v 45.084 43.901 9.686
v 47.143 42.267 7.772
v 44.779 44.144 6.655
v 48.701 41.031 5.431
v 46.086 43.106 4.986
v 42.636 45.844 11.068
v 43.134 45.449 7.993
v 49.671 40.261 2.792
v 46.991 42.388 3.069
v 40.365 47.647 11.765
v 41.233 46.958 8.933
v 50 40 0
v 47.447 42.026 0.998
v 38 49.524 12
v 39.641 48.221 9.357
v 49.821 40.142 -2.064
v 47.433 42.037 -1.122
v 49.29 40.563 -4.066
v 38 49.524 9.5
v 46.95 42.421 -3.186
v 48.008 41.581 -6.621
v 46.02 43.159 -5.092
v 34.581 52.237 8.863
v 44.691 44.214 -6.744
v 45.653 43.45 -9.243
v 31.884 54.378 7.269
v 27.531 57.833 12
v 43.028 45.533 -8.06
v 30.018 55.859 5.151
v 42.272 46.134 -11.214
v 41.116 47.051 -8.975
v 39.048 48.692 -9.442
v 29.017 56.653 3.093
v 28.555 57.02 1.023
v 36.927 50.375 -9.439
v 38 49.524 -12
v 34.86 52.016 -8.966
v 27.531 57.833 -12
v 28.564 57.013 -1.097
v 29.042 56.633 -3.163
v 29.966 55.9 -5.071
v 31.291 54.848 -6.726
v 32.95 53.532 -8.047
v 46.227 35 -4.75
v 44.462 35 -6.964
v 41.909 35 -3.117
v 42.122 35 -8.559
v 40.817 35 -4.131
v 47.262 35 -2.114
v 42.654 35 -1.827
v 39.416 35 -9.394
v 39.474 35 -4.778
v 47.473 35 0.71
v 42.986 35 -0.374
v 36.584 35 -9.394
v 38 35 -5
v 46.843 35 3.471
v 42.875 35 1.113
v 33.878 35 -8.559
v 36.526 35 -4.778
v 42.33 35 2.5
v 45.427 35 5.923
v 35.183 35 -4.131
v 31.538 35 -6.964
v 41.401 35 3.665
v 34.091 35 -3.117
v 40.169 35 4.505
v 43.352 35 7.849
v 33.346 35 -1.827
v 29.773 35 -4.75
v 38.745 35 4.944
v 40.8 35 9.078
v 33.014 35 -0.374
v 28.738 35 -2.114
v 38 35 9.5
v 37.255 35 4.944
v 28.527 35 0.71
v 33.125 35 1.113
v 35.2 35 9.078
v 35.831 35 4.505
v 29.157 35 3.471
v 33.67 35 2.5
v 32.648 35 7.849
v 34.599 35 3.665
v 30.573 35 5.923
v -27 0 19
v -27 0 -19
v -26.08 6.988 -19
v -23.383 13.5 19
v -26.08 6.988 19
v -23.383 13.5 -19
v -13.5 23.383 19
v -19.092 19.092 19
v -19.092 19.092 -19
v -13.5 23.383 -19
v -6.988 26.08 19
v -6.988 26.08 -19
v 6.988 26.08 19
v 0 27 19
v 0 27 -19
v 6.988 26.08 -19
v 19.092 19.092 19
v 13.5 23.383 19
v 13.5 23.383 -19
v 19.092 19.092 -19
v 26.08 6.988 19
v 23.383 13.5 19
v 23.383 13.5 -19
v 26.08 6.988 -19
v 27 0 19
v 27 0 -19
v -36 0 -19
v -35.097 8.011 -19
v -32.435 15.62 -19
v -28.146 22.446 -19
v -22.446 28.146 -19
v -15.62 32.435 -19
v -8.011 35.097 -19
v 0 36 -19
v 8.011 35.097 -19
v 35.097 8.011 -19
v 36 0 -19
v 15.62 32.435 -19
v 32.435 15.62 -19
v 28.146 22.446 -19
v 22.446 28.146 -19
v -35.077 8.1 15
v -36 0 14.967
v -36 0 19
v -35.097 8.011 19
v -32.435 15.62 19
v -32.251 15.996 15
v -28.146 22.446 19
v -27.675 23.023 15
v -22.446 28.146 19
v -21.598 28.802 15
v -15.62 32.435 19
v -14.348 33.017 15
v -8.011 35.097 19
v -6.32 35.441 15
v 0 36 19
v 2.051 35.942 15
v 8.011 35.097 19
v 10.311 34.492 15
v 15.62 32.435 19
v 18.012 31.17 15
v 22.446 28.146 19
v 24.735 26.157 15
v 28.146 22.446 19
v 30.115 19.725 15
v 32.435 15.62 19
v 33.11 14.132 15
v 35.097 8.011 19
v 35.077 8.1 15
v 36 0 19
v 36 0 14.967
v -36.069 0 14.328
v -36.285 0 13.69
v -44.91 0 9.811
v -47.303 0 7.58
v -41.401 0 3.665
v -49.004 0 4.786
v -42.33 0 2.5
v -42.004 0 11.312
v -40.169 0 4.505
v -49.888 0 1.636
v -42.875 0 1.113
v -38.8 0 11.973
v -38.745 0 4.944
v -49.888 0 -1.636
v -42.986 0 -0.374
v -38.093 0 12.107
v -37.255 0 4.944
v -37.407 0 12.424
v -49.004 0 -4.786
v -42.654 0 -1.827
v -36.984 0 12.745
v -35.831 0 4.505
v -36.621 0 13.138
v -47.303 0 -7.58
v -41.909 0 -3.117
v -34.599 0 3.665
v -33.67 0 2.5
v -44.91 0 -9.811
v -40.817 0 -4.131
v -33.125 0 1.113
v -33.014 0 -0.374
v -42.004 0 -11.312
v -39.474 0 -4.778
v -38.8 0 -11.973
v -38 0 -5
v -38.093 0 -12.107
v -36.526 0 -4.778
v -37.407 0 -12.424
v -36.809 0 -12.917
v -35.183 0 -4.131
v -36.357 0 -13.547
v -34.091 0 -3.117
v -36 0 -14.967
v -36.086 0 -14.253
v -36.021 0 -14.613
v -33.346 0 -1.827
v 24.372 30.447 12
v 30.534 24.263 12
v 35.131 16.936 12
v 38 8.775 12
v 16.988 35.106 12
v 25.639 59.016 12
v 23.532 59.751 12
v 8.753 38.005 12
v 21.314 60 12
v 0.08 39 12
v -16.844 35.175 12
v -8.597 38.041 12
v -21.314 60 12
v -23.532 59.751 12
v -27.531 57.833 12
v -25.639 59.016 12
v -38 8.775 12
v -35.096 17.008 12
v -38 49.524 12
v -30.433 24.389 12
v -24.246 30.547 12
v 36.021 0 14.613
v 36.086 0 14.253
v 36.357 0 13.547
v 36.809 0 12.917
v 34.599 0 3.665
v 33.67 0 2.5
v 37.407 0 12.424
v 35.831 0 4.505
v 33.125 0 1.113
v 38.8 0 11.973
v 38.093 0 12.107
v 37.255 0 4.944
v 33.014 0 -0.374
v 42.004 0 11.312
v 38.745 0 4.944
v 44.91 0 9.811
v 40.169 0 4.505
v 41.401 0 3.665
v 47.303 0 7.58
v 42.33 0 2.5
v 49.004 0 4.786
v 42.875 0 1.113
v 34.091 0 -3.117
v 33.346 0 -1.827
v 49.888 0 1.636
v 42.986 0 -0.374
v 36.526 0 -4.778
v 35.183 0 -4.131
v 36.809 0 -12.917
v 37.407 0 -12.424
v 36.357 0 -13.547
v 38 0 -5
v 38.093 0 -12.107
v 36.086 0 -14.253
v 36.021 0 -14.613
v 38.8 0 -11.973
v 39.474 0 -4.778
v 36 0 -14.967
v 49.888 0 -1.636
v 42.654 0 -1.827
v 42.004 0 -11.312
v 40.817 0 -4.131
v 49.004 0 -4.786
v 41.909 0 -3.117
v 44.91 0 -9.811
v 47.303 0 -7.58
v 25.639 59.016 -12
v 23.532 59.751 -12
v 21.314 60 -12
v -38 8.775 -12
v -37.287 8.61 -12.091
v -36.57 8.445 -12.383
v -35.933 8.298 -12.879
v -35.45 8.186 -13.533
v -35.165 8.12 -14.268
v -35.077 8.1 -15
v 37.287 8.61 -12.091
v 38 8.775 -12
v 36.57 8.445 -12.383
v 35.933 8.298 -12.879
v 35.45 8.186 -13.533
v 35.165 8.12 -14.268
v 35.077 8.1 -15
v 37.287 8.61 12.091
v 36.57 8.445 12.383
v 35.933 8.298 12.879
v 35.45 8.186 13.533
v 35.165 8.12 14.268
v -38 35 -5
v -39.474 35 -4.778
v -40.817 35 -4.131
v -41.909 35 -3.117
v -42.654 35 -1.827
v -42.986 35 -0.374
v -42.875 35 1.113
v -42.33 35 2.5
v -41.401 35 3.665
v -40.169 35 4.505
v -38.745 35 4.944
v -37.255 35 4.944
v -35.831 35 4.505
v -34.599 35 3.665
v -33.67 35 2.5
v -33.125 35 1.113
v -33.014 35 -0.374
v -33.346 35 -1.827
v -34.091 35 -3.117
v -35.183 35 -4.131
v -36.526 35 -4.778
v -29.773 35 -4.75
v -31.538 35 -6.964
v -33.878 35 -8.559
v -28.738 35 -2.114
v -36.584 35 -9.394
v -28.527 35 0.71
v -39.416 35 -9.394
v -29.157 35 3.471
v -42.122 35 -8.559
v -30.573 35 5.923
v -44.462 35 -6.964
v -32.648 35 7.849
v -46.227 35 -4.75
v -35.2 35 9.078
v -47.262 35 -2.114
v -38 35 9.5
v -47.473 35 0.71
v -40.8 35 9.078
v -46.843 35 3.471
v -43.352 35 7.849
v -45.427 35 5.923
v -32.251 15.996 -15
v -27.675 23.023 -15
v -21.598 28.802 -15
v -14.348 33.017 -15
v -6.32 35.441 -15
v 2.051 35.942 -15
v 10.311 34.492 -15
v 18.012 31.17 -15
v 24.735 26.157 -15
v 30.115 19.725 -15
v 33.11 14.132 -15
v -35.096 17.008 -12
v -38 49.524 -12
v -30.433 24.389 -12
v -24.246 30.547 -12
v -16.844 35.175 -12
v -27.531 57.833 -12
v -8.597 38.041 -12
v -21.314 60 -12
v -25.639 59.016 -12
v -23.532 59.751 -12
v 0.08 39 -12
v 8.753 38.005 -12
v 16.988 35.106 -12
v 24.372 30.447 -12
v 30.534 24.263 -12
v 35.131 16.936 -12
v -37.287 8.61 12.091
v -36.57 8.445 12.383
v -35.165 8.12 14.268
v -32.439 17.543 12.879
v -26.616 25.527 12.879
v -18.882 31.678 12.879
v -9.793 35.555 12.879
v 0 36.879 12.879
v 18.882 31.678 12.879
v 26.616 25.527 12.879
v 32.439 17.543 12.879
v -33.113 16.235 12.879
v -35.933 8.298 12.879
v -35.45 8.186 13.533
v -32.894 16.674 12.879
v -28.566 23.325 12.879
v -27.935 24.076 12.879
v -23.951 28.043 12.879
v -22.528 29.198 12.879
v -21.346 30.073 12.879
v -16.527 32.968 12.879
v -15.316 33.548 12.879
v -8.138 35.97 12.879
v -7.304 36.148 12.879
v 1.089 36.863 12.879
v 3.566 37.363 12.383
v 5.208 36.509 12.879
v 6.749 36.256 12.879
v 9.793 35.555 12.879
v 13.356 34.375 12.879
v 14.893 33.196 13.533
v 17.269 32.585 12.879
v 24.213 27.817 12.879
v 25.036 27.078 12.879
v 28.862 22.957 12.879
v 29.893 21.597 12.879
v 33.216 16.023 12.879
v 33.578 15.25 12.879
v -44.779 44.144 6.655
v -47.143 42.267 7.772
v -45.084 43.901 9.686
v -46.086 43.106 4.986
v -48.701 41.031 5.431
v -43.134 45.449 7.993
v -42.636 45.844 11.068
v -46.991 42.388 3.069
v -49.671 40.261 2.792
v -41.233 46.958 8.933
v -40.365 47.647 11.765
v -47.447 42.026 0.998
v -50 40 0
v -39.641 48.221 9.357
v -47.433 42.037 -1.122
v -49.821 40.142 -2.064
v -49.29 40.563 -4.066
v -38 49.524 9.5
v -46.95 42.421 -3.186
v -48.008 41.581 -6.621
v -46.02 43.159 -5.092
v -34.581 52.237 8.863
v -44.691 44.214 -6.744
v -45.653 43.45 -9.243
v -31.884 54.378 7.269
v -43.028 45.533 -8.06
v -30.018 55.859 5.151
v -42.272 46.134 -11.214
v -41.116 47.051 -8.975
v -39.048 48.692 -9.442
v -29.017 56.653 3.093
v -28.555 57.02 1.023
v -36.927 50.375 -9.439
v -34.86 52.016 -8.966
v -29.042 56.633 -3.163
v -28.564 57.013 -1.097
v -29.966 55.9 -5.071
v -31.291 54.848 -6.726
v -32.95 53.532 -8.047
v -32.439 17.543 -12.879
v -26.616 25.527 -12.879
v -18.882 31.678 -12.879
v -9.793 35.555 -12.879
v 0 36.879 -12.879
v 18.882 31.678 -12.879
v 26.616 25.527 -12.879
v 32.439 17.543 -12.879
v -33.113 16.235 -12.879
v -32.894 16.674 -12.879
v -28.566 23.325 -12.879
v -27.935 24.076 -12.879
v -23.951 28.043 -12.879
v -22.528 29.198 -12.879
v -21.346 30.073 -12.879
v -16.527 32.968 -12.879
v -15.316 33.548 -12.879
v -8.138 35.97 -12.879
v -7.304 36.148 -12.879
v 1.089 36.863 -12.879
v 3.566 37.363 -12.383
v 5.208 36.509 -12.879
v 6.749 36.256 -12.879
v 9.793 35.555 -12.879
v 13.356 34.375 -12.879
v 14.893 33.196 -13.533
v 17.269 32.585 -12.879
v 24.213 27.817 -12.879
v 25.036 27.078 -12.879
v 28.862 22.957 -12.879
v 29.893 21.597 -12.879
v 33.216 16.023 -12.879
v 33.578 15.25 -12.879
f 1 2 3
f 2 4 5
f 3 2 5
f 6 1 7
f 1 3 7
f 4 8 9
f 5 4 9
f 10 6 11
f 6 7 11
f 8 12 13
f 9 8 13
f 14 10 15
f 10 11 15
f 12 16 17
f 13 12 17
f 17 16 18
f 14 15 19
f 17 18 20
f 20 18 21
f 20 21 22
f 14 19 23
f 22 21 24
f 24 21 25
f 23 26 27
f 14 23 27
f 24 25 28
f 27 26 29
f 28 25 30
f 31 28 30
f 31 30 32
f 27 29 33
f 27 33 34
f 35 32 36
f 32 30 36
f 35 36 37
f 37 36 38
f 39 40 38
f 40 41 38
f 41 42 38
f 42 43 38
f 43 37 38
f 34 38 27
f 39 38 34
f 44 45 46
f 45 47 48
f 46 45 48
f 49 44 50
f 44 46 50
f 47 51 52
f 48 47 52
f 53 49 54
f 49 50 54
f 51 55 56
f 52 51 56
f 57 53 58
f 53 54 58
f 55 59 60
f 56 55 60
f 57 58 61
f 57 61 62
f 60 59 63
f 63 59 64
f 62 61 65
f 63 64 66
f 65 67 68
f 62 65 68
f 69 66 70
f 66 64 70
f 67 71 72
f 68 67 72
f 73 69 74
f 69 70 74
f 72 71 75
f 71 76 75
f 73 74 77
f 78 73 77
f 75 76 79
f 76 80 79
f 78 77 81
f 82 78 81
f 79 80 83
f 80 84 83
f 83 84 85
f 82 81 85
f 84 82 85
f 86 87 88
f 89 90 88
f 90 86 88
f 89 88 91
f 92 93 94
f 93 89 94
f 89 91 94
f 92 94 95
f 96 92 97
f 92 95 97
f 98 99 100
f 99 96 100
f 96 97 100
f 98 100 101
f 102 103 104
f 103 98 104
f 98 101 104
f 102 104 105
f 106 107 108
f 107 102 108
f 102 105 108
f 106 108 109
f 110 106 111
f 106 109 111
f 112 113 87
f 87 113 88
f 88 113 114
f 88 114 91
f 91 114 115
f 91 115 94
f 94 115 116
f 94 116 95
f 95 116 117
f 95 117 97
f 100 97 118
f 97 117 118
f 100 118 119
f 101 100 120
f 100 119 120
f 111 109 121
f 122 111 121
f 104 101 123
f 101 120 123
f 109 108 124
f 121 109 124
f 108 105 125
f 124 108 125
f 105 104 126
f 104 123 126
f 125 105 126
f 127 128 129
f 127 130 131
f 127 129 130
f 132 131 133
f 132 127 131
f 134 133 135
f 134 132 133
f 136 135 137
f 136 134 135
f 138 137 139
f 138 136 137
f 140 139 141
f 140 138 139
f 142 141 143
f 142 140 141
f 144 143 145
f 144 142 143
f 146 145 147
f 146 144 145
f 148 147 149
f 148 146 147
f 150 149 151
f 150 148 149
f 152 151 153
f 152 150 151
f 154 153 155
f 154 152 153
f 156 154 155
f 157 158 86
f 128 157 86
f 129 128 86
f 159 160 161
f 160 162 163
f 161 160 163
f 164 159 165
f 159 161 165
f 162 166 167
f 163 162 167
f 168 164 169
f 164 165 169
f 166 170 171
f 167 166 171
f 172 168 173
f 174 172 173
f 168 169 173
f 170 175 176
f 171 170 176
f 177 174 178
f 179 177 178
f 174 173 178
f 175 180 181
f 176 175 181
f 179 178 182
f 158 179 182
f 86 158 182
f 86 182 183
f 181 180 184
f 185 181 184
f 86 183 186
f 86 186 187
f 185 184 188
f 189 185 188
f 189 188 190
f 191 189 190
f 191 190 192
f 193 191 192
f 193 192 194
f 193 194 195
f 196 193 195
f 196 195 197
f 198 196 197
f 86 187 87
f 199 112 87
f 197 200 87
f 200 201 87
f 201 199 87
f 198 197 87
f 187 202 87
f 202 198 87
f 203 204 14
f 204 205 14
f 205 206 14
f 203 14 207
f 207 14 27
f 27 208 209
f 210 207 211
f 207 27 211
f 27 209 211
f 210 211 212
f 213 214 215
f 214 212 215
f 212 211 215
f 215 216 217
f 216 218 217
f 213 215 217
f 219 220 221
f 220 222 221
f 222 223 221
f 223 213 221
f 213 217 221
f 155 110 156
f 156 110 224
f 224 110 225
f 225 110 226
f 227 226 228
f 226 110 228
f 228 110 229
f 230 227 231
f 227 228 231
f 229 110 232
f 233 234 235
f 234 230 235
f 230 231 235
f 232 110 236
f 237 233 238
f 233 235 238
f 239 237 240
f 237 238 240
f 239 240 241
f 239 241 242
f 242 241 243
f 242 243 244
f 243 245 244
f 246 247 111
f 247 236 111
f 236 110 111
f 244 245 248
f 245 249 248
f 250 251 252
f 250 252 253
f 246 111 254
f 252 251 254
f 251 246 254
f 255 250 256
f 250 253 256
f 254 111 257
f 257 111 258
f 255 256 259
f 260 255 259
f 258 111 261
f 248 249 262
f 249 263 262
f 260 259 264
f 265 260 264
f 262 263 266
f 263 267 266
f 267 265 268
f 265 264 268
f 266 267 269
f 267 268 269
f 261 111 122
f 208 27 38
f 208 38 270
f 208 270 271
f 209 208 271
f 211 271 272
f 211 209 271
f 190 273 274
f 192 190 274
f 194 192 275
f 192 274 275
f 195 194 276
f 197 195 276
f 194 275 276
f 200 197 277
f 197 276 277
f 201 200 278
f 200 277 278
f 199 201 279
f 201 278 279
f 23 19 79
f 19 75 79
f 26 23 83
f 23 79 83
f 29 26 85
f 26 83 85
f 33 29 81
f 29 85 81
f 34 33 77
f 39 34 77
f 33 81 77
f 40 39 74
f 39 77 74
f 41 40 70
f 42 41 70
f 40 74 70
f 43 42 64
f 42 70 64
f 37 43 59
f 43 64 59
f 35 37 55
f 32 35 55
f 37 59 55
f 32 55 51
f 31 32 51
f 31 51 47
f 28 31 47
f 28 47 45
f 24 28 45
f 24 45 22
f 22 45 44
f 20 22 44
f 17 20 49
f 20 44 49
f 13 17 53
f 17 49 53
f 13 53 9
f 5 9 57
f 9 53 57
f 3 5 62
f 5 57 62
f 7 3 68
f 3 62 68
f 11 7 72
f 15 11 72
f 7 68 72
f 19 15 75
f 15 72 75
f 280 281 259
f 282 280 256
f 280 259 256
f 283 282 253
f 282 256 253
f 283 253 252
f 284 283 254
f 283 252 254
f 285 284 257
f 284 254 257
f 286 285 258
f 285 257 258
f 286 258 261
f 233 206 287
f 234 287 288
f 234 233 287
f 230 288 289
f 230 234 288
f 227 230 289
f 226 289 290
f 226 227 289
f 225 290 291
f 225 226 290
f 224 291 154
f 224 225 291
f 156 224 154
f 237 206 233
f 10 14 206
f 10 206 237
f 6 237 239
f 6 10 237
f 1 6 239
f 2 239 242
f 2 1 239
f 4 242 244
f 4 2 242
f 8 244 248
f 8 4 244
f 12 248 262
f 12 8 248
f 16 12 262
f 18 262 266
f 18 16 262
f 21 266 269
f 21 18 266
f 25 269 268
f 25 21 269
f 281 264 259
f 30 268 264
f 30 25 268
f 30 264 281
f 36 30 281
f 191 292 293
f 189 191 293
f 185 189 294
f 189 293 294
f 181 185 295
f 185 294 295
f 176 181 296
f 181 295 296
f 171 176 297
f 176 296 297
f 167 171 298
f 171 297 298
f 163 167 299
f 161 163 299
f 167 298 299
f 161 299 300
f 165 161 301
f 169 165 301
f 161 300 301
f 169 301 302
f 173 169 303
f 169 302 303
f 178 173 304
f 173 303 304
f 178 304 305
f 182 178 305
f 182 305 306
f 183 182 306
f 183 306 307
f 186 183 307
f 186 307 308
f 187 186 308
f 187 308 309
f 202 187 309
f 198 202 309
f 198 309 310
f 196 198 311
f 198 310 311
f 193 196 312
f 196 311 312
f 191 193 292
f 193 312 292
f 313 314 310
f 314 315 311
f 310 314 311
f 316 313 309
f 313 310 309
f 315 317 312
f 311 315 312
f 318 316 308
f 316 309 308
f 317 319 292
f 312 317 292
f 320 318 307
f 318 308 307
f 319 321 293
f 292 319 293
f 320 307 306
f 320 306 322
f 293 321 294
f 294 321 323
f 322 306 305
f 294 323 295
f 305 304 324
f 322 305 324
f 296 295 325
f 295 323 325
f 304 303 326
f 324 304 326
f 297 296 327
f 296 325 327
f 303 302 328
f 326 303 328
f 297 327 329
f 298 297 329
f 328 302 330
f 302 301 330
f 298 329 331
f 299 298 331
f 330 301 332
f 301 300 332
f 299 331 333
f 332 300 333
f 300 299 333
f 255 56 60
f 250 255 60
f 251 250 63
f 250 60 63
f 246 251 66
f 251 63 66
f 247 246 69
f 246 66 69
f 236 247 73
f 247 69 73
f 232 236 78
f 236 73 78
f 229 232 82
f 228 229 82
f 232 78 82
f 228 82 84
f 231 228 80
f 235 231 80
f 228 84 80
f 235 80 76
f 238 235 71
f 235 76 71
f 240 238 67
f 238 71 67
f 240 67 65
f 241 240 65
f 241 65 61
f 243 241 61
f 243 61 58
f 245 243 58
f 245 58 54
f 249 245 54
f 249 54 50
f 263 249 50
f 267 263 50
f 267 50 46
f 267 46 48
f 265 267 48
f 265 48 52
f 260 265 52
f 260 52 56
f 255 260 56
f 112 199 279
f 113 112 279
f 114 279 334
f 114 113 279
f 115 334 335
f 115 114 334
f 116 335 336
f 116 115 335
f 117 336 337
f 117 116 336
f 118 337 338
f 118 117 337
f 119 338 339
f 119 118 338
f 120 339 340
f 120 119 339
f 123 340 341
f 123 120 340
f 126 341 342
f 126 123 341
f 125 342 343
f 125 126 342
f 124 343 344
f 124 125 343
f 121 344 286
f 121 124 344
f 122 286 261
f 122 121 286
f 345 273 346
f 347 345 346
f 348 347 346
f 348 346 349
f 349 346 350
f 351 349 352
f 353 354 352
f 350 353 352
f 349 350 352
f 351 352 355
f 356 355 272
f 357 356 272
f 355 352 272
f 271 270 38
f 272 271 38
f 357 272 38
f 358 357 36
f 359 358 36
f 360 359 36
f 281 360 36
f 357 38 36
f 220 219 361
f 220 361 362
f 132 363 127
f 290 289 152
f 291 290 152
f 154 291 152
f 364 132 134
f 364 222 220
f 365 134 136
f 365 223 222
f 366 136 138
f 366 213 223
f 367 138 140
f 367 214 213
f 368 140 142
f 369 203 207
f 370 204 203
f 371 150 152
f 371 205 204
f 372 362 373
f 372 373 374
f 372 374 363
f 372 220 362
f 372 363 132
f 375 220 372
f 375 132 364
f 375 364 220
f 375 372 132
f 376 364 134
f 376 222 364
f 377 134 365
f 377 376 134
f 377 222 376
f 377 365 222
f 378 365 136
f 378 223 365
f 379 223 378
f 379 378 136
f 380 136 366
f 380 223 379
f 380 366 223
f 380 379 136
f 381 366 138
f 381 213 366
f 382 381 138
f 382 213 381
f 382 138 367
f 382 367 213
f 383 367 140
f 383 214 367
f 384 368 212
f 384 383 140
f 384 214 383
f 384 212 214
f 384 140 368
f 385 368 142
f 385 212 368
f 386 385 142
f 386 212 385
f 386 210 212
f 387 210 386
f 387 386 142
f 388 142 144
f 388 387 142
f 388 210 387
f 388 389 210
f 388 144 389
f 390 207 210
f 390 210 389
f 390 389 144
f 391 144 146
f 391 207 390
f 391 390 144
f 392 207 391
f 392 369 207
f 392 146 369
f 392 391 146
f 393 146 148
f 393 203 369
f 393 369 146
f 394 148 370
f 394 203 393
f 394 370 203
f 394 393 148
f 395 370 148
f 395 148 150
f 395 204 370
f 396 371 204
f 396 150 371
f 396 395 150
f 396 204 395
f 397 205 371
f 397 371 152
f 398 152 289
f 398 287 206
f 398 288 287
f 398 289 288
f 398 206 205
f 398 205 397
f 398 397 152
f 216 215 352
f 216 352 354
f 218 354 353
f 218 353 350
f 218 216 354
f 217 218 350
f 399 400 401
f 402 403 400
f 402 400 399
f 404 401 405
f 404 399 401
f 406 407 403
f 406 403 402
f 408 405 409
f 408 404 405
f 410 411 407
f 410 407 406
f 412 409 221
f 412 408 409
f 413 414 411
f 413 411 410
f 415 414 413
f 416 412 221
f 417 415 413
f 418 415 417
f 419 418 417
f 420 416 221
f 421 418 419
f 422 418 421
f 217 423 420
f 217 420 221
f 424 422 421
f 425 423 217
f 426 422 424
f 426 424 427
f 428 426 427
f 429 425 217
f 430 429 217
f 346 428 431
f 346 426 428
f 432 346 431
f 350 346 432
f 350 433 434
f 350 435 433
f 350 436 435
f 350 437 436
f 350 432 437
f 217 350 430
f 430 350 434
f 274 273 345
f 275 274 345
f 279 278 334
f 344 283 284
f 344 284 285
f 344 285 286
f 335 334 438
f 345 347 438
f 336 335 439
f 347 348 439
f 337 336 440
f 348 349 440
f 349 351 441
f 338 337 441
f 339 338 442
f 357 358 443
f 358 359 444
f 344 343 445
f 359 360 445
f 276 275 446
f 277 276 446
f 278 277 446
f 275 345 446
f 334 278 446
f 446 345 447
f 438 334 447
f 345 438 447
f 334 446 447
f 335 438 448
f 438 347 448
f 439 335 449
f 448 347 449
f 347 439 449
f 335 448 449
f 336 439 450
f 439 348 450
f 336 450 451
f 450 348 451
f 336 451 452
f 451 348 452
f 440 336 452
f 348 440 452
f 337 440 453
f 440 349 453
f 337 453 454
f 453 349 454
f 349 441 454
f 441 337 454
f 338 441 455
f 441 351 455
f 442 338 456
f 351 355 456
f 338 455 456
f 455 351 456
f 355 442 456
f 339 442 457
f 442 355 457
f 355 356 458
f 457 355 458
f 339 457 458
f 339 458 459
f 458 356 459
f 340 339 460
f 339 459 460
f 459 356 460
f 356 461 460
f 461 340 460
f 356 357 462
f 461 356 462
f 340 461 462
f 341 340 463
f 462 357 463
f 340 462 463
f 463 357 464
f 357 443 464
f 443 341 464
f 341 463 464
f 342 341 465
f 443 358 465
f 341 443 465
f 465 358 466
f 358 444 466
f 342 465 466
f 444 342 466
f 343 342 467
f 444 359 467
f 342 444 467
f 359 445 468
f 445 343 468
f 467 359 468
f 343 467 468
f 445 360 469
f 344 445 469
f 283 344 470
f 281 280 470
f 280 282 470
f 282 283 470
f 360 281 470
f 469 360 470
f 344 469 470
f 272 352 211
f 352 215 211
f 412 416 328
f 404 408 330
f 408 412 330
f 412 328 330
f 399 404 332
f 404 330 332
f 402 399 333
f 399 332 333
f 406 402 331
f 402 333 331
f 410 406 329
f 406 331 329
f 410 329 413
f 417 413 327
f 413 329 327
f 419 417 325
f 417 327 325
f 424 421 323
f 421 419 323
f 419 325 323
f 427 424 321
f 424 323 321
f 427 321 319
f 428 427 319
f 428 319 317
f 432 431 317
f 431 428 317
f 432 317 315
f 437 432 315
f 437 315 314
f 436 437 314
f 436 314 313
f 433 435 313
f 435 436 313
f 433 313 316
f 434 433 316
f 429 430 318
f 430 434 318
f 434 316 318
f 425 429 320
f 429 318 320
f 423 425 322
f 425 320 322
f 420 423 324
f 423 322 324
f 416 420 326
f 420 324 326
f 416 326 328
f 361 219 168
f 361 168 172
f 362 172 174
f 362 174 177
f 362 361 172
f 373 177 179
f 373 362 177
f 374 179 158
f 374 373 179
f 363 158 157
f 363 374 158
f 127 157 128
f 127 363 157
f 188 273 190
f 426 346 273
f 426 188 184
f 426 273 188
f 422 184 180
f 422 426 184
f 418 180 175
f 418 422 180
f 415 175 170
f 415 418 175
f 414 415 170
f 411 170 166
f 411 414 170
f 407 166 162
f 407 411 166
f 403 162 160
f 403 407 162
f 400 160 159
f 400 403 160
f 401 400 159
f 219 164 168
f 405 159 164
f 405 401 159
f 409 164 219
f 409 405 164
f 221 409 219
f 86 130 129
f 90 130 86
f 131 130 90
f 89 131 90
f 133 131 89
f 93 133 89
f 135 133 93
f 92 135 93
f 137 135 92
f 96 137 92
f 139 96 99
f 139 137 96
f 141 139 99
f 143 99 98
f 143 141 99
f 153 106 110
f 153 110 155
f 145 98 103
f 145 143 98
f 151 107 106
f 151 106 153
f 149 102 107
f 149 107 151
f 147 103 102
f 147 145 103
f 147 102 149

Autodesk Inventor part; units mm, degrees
ref_plane "YZ Plane" through (0, 0, 0) normal (1, 0, 0) x (0, 1, 0)
ref_plane "XZ Plane" through (0, 0, 0) normal (0, 1, 0) x (-1, 0, 0)
sketch "Sketch1" plane through (0, 0, 0) normal (0, 0, 1) x (1, 0, 0)
  arc A0 (36, 0) -> (-36, 0) centre (0, 0) ccw
  arc A1 (27, 0) -> (-27, 0) centre (0, 0) ccw
  line L0 (-36, 0) -> (-27, 0)
  line L1 (27, 0) -> (36, 0)
  dimension "d0" = 72
  dimension "d1" = 54
  dimension "d2" = 27
  dimension "d3" = 36
extrude "Extrusion1" add sketch "Sketch1" along normal mid plane 38
ref_plane "Work Plane1" through (-36, 60, 19) normal (0, -1, 0) x (1, 0, 0)
sketch "Sketch2" plane through (-36, 60, 19) normal (0, -1, 0) x (1, 0, 0)
  line L0 (9, 0) -> (63, 0) projected
  line L1 (0, -38) -> (0, 0) projected
  line L2 (-2, -19) -> (74, -19) construction
  line L3 (-2, -31) -> (74, -31)
  line L4 (74, -7) -> (-2, -7)
  arc A0 (-2, -7) -> (-2, -31) centre (-2, -19) ccw
  arc A1 (74, -31) -> (74, -7) centre (74, -19) ccw
  point P0 (36, -19)
  point P1 (36, -19)
  point P2 (36, 0)
  point P3 (-14, -19)
  point P4 (0, -19)
  dimension "d7" = 76
  dimension "d8" = 12
extrude "Extrusion2" add sketch "Sketch2" along normal up to surface (60 mm away)
sketch "Sketch3" plane through (0, 0, 12) normal (0, 0, 1) x (1, 0, 0)
  arc A0 (27, 0) -> (-27, 0) centre (0, 0) ccw projected
  line L0 (-27, 0) -> (27, 0) projected
extrude "Extrusion3" cut sketch "Sketch3" against normal through all
sketch "Sketch4" plane through (0, 0, 0) normal (0, 0, 1) x (1, 0, 0)
  arc A0 (27, 0) -> (-27, 0) centre (0, 0) ccw projected
  line L0 (38, 60) -> (-38, 60) projected
  line L1 (-50, 60) -> (-50, 0) projected
  line L2 (-50, 60) -> (-50, 0) projected
  line L3 (-50, 60) -> (-38, 60) projected
  line L4 (-50, 40) -> (-24.8, 60)
  line L5 (-50, 40) -> (-50, 60)
  line L6 (0, 0) -> (0, 60) construction
  line L7 (-38, 60) -> (38, 60)
  line L8 (50, 60) -> (50, 0)
  line L9 (50, 60) -> (38, 60)
  line L10 (50, 40) -> (24.8, 60)
  point P0 (24.8, 60)
  point P1 (50, 40)
  point P2 (-50, 40)
  dimension "d13" = 20
  dimension "d14" = 25.2
extrude "Extrusion4" cut sketch "Sketch4" along normal through all both and the other way through all
fillet "Fillet1" radius 10 2 edges at (24.8, 60, 0) (-24.8, 60, 0)
sketch "Sketch5" plane through (-36, 0, 19) normal (0, -1, 0) x (1, 0, 0)
  arc A0 (-2, -7) -> (-2, -31) centre (-2, -19) ccw projected
  point P0 (36, -19)
  point P1 (0, -31)
  point P2 (0, -7)
hole "Hole1" at (-38, 0, 0) direction (0, 1, 0) diameter 10 end through all
sketch "Sketch6" plane through (27, 0, -19) normal (0, -1, 0) x (1, 0, 0)
  arc A0 (11, 7) -> (11, 31) centre (11, 19) ccw projected
  point P0 (-27, 19)
  point P1 (9, 31)
  point P2 (9, 7)
hole "Hole2" at (38, 0, 0) direction (0, 1, 0) diameter 10 end through all
sketch "Sketch7" plane through (-36, 60, 19) normal (0, 1, 0) x (1, 0, 0)
  circle A0 centre (-2, 19) radius 5 projected
  circle A1 centre (74, 19) radius 5 projected
  point P0 (36, 19)
hole "Hole3" at (-38, 60, 0) at (38, 60, 0) direction (0, -1, 0) diameter 10 end through all counterbore diameter 19 counterbore depth 25
fillet "Fillet2" radius 3 2 edges at (0, 36, -12) (0, 36, 12)
equation "\"d23\" = Thickness"
equation "\"BendRadius\" = Thickness"
equation "\"BendReliefWidth\" = Thickness"
equation "\"BendReliefDepth\" = 0.5 * Thickness"
equation "\"CornerReliefSize\" = 4 * Thickness"
equation "\"MinimumRemnant\" = 2 * Thickness"
equation "\"TransitionRadius\" = BendRadius"
equation "\"JacobiRadiusSize\" = BendRadius"
equation "\"GapSize\" = Thickness"
equation "\"Thickness\" = 0.5"
properties part number "Part 4 Connecting rods cap" material "Stainless Steel"
